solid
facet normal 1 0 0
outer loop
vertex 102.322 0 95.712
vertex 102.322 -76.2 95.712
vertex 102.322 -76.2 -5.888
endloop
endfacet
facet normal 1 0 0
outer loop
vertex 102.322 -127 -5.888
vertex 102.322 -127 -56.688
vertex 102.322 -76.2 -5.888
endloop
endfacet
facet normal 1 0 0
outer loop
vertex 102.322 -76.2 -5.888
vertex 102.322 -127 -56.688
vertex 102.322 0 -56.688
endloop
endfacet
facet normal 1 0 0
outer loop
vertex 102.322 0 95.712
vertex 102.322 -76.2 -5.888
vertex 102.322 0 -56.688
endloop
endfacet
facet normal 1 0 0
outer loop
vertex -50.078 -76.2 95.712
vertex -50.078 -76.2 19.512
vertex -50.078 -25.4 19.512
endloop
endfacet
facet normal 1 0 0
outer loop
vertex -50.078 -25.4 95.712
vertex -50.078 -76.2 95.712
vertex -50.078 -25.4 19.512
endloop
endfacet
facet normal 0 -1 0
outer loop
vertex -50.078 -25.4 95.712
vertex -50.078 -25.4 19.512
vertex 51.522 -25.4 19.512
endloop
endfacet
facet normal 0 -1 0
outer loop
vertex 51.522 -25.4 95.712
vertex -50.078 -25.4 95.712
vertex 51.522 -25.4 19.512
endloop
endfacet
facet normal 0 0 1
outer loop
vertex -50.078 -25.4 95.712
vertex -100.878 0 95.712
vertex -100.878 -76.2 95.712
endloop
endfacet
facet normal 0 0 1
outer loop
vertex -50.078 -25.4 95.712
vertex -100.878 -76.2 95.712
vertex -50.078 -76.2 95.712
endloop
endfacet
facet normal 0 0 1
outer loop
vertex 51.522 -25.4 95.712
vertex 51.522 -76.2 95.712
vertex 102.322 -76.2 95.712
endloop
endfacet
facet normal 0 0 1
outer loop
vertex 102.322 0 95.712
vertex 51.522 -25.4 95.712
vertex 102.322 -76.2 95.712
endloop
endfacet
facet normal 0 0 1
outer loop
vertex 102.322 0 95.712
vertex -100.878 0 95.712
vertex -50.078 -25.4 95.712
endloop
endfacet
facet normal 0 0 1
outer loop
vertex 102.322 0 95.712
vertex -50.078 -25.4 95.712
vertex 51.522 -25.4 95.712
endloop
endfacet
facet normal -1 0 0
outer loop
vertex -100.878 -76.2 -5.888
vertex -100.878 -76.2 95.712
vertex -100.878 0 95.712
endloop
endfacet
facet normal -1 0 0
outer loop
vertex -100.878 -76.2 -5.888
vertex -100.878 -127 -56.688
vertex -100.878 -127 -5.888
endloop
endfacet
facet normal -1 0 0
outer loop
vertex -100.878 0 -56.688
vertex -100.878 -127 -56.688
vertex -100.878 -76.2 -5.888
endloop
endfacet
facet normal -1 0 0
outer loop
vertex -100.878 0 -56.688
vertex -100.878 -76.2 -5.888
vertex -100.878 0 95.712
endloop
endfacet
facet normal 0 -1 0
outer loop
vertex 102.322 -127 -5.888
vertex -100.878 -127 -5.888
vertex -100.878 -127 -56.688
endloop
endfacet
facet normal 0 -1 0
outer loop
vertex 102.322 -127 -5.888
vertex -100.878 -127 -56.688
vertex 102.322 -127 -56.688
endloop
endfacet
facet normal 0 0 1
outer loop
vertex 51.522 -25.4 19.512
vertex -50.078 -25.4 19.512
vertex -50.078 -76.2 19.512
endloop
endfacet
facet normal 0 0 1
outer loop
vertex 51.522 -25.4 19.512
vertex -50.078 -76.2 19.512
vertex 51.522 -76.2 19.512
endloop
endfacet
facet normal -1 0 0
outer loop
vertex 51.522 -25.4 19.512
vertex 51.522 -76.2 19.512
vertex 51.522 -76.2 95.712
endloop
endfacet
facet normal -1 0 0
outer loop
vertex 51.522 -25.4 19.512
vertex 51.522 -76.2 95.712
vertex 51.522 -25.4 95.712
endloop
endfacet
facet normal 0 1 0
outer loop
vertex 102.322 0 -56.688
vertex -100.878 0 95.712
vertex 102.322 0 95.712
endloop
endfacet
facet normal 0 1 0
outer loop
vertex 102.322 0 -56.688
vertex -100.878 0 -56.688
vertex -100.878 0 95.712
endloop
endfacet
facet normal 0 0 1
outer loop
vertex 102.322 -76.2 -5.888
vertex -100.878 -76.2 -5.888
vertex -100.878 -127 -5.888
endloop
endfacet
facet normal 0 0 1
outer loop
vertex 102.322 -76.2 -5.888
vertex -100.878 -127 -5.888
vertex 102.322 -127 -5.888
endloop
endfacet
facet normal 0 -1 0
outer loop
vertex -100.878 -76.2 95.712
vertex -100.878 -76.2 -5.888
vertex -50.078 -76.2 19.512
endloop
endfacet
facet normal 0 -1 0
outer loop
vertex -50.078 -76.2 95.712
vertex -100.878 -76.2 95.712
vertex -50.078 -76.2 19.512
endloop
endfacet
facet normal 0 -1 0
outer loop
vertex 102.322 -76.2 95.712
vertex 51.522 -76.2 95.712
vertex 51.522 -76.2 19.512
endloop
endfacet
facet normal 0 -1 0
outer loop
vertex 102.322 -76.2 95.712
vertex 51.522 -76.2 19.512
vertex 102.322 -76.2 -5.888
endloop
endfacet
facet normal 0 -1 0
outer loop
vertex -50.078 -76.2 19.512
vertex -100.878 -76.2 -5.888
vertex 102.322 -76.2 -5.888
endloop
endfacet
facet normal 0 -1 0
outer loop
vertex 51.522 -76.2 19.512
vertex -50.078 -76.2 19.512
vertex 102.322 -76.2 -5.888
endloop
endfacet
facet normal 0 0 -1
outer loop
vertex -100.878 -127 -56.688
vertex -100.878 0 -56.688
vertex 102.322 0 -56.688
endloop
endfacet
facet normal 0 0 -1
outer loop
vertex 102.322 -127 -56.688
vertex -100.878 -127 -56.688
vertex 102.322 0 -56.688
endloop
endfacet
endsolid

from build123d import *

# Parameters (mm, degrees)
F0_W     = 203.2
F0_H     = 50.8
F1_DEPTH = 127
F2_W     = 50.8
F2_H     = 76.2
F3_DEPTH = 101.6
F4_W     = 50.8
F4_H     = 76.2
F5_DEPTH = 101.6
F6_W     = 101.6
F6_H     = 50.8
F7_DEPTH = 25.4
F8_W     = 101.6
F8_H     = 25.4
F9_DEPTH = 101.6


with BuildPart() as f1:
    # F0 (on Front) → F1 (new body)
    with BuildSketch(Plane.XZ):
        with Locations((0.721672, -31.288108)):
            Rectangle(F0_W, F0_H)
    extrude(amount=F1_DEPTH)

    # F2 (on face) → F3 (join)
    with BuildSketch(Plane.XY.offset(-5.888108)):
        with Locations((-75.478328, -38.1)):
            Rectangle(F2_W, F2_H)
    extrude(amount=F3_DEPTH)

    # F4 (on face) → F5 (join)
    with BuildSketch(Plane.XY.offset(-5.888108)):
        with Locations((76.921672, -38.1)):
            Rectangle(F4_W, F4_H)
    extrude(amount=F5_DEPTH)

    # F6 (on face) → F7 (join)
    with BuildSketch(Plane.XY.offset(-5.888108)):
        with Locations((0.721672, -50.8)):
            Rectangle(F6_W, F6_H)
    extrude(amount=F7_DEPTH)

    # F8 (on face) → F9 (join)
    with BuildSketch(Plane.XY.offset(-5.888108)):
        with Locations((0.721672, -12.7)):
            Rectangle(F8_W, F8_H)
    extrude(amount=F9_DEPTH)


solid = f1.part
